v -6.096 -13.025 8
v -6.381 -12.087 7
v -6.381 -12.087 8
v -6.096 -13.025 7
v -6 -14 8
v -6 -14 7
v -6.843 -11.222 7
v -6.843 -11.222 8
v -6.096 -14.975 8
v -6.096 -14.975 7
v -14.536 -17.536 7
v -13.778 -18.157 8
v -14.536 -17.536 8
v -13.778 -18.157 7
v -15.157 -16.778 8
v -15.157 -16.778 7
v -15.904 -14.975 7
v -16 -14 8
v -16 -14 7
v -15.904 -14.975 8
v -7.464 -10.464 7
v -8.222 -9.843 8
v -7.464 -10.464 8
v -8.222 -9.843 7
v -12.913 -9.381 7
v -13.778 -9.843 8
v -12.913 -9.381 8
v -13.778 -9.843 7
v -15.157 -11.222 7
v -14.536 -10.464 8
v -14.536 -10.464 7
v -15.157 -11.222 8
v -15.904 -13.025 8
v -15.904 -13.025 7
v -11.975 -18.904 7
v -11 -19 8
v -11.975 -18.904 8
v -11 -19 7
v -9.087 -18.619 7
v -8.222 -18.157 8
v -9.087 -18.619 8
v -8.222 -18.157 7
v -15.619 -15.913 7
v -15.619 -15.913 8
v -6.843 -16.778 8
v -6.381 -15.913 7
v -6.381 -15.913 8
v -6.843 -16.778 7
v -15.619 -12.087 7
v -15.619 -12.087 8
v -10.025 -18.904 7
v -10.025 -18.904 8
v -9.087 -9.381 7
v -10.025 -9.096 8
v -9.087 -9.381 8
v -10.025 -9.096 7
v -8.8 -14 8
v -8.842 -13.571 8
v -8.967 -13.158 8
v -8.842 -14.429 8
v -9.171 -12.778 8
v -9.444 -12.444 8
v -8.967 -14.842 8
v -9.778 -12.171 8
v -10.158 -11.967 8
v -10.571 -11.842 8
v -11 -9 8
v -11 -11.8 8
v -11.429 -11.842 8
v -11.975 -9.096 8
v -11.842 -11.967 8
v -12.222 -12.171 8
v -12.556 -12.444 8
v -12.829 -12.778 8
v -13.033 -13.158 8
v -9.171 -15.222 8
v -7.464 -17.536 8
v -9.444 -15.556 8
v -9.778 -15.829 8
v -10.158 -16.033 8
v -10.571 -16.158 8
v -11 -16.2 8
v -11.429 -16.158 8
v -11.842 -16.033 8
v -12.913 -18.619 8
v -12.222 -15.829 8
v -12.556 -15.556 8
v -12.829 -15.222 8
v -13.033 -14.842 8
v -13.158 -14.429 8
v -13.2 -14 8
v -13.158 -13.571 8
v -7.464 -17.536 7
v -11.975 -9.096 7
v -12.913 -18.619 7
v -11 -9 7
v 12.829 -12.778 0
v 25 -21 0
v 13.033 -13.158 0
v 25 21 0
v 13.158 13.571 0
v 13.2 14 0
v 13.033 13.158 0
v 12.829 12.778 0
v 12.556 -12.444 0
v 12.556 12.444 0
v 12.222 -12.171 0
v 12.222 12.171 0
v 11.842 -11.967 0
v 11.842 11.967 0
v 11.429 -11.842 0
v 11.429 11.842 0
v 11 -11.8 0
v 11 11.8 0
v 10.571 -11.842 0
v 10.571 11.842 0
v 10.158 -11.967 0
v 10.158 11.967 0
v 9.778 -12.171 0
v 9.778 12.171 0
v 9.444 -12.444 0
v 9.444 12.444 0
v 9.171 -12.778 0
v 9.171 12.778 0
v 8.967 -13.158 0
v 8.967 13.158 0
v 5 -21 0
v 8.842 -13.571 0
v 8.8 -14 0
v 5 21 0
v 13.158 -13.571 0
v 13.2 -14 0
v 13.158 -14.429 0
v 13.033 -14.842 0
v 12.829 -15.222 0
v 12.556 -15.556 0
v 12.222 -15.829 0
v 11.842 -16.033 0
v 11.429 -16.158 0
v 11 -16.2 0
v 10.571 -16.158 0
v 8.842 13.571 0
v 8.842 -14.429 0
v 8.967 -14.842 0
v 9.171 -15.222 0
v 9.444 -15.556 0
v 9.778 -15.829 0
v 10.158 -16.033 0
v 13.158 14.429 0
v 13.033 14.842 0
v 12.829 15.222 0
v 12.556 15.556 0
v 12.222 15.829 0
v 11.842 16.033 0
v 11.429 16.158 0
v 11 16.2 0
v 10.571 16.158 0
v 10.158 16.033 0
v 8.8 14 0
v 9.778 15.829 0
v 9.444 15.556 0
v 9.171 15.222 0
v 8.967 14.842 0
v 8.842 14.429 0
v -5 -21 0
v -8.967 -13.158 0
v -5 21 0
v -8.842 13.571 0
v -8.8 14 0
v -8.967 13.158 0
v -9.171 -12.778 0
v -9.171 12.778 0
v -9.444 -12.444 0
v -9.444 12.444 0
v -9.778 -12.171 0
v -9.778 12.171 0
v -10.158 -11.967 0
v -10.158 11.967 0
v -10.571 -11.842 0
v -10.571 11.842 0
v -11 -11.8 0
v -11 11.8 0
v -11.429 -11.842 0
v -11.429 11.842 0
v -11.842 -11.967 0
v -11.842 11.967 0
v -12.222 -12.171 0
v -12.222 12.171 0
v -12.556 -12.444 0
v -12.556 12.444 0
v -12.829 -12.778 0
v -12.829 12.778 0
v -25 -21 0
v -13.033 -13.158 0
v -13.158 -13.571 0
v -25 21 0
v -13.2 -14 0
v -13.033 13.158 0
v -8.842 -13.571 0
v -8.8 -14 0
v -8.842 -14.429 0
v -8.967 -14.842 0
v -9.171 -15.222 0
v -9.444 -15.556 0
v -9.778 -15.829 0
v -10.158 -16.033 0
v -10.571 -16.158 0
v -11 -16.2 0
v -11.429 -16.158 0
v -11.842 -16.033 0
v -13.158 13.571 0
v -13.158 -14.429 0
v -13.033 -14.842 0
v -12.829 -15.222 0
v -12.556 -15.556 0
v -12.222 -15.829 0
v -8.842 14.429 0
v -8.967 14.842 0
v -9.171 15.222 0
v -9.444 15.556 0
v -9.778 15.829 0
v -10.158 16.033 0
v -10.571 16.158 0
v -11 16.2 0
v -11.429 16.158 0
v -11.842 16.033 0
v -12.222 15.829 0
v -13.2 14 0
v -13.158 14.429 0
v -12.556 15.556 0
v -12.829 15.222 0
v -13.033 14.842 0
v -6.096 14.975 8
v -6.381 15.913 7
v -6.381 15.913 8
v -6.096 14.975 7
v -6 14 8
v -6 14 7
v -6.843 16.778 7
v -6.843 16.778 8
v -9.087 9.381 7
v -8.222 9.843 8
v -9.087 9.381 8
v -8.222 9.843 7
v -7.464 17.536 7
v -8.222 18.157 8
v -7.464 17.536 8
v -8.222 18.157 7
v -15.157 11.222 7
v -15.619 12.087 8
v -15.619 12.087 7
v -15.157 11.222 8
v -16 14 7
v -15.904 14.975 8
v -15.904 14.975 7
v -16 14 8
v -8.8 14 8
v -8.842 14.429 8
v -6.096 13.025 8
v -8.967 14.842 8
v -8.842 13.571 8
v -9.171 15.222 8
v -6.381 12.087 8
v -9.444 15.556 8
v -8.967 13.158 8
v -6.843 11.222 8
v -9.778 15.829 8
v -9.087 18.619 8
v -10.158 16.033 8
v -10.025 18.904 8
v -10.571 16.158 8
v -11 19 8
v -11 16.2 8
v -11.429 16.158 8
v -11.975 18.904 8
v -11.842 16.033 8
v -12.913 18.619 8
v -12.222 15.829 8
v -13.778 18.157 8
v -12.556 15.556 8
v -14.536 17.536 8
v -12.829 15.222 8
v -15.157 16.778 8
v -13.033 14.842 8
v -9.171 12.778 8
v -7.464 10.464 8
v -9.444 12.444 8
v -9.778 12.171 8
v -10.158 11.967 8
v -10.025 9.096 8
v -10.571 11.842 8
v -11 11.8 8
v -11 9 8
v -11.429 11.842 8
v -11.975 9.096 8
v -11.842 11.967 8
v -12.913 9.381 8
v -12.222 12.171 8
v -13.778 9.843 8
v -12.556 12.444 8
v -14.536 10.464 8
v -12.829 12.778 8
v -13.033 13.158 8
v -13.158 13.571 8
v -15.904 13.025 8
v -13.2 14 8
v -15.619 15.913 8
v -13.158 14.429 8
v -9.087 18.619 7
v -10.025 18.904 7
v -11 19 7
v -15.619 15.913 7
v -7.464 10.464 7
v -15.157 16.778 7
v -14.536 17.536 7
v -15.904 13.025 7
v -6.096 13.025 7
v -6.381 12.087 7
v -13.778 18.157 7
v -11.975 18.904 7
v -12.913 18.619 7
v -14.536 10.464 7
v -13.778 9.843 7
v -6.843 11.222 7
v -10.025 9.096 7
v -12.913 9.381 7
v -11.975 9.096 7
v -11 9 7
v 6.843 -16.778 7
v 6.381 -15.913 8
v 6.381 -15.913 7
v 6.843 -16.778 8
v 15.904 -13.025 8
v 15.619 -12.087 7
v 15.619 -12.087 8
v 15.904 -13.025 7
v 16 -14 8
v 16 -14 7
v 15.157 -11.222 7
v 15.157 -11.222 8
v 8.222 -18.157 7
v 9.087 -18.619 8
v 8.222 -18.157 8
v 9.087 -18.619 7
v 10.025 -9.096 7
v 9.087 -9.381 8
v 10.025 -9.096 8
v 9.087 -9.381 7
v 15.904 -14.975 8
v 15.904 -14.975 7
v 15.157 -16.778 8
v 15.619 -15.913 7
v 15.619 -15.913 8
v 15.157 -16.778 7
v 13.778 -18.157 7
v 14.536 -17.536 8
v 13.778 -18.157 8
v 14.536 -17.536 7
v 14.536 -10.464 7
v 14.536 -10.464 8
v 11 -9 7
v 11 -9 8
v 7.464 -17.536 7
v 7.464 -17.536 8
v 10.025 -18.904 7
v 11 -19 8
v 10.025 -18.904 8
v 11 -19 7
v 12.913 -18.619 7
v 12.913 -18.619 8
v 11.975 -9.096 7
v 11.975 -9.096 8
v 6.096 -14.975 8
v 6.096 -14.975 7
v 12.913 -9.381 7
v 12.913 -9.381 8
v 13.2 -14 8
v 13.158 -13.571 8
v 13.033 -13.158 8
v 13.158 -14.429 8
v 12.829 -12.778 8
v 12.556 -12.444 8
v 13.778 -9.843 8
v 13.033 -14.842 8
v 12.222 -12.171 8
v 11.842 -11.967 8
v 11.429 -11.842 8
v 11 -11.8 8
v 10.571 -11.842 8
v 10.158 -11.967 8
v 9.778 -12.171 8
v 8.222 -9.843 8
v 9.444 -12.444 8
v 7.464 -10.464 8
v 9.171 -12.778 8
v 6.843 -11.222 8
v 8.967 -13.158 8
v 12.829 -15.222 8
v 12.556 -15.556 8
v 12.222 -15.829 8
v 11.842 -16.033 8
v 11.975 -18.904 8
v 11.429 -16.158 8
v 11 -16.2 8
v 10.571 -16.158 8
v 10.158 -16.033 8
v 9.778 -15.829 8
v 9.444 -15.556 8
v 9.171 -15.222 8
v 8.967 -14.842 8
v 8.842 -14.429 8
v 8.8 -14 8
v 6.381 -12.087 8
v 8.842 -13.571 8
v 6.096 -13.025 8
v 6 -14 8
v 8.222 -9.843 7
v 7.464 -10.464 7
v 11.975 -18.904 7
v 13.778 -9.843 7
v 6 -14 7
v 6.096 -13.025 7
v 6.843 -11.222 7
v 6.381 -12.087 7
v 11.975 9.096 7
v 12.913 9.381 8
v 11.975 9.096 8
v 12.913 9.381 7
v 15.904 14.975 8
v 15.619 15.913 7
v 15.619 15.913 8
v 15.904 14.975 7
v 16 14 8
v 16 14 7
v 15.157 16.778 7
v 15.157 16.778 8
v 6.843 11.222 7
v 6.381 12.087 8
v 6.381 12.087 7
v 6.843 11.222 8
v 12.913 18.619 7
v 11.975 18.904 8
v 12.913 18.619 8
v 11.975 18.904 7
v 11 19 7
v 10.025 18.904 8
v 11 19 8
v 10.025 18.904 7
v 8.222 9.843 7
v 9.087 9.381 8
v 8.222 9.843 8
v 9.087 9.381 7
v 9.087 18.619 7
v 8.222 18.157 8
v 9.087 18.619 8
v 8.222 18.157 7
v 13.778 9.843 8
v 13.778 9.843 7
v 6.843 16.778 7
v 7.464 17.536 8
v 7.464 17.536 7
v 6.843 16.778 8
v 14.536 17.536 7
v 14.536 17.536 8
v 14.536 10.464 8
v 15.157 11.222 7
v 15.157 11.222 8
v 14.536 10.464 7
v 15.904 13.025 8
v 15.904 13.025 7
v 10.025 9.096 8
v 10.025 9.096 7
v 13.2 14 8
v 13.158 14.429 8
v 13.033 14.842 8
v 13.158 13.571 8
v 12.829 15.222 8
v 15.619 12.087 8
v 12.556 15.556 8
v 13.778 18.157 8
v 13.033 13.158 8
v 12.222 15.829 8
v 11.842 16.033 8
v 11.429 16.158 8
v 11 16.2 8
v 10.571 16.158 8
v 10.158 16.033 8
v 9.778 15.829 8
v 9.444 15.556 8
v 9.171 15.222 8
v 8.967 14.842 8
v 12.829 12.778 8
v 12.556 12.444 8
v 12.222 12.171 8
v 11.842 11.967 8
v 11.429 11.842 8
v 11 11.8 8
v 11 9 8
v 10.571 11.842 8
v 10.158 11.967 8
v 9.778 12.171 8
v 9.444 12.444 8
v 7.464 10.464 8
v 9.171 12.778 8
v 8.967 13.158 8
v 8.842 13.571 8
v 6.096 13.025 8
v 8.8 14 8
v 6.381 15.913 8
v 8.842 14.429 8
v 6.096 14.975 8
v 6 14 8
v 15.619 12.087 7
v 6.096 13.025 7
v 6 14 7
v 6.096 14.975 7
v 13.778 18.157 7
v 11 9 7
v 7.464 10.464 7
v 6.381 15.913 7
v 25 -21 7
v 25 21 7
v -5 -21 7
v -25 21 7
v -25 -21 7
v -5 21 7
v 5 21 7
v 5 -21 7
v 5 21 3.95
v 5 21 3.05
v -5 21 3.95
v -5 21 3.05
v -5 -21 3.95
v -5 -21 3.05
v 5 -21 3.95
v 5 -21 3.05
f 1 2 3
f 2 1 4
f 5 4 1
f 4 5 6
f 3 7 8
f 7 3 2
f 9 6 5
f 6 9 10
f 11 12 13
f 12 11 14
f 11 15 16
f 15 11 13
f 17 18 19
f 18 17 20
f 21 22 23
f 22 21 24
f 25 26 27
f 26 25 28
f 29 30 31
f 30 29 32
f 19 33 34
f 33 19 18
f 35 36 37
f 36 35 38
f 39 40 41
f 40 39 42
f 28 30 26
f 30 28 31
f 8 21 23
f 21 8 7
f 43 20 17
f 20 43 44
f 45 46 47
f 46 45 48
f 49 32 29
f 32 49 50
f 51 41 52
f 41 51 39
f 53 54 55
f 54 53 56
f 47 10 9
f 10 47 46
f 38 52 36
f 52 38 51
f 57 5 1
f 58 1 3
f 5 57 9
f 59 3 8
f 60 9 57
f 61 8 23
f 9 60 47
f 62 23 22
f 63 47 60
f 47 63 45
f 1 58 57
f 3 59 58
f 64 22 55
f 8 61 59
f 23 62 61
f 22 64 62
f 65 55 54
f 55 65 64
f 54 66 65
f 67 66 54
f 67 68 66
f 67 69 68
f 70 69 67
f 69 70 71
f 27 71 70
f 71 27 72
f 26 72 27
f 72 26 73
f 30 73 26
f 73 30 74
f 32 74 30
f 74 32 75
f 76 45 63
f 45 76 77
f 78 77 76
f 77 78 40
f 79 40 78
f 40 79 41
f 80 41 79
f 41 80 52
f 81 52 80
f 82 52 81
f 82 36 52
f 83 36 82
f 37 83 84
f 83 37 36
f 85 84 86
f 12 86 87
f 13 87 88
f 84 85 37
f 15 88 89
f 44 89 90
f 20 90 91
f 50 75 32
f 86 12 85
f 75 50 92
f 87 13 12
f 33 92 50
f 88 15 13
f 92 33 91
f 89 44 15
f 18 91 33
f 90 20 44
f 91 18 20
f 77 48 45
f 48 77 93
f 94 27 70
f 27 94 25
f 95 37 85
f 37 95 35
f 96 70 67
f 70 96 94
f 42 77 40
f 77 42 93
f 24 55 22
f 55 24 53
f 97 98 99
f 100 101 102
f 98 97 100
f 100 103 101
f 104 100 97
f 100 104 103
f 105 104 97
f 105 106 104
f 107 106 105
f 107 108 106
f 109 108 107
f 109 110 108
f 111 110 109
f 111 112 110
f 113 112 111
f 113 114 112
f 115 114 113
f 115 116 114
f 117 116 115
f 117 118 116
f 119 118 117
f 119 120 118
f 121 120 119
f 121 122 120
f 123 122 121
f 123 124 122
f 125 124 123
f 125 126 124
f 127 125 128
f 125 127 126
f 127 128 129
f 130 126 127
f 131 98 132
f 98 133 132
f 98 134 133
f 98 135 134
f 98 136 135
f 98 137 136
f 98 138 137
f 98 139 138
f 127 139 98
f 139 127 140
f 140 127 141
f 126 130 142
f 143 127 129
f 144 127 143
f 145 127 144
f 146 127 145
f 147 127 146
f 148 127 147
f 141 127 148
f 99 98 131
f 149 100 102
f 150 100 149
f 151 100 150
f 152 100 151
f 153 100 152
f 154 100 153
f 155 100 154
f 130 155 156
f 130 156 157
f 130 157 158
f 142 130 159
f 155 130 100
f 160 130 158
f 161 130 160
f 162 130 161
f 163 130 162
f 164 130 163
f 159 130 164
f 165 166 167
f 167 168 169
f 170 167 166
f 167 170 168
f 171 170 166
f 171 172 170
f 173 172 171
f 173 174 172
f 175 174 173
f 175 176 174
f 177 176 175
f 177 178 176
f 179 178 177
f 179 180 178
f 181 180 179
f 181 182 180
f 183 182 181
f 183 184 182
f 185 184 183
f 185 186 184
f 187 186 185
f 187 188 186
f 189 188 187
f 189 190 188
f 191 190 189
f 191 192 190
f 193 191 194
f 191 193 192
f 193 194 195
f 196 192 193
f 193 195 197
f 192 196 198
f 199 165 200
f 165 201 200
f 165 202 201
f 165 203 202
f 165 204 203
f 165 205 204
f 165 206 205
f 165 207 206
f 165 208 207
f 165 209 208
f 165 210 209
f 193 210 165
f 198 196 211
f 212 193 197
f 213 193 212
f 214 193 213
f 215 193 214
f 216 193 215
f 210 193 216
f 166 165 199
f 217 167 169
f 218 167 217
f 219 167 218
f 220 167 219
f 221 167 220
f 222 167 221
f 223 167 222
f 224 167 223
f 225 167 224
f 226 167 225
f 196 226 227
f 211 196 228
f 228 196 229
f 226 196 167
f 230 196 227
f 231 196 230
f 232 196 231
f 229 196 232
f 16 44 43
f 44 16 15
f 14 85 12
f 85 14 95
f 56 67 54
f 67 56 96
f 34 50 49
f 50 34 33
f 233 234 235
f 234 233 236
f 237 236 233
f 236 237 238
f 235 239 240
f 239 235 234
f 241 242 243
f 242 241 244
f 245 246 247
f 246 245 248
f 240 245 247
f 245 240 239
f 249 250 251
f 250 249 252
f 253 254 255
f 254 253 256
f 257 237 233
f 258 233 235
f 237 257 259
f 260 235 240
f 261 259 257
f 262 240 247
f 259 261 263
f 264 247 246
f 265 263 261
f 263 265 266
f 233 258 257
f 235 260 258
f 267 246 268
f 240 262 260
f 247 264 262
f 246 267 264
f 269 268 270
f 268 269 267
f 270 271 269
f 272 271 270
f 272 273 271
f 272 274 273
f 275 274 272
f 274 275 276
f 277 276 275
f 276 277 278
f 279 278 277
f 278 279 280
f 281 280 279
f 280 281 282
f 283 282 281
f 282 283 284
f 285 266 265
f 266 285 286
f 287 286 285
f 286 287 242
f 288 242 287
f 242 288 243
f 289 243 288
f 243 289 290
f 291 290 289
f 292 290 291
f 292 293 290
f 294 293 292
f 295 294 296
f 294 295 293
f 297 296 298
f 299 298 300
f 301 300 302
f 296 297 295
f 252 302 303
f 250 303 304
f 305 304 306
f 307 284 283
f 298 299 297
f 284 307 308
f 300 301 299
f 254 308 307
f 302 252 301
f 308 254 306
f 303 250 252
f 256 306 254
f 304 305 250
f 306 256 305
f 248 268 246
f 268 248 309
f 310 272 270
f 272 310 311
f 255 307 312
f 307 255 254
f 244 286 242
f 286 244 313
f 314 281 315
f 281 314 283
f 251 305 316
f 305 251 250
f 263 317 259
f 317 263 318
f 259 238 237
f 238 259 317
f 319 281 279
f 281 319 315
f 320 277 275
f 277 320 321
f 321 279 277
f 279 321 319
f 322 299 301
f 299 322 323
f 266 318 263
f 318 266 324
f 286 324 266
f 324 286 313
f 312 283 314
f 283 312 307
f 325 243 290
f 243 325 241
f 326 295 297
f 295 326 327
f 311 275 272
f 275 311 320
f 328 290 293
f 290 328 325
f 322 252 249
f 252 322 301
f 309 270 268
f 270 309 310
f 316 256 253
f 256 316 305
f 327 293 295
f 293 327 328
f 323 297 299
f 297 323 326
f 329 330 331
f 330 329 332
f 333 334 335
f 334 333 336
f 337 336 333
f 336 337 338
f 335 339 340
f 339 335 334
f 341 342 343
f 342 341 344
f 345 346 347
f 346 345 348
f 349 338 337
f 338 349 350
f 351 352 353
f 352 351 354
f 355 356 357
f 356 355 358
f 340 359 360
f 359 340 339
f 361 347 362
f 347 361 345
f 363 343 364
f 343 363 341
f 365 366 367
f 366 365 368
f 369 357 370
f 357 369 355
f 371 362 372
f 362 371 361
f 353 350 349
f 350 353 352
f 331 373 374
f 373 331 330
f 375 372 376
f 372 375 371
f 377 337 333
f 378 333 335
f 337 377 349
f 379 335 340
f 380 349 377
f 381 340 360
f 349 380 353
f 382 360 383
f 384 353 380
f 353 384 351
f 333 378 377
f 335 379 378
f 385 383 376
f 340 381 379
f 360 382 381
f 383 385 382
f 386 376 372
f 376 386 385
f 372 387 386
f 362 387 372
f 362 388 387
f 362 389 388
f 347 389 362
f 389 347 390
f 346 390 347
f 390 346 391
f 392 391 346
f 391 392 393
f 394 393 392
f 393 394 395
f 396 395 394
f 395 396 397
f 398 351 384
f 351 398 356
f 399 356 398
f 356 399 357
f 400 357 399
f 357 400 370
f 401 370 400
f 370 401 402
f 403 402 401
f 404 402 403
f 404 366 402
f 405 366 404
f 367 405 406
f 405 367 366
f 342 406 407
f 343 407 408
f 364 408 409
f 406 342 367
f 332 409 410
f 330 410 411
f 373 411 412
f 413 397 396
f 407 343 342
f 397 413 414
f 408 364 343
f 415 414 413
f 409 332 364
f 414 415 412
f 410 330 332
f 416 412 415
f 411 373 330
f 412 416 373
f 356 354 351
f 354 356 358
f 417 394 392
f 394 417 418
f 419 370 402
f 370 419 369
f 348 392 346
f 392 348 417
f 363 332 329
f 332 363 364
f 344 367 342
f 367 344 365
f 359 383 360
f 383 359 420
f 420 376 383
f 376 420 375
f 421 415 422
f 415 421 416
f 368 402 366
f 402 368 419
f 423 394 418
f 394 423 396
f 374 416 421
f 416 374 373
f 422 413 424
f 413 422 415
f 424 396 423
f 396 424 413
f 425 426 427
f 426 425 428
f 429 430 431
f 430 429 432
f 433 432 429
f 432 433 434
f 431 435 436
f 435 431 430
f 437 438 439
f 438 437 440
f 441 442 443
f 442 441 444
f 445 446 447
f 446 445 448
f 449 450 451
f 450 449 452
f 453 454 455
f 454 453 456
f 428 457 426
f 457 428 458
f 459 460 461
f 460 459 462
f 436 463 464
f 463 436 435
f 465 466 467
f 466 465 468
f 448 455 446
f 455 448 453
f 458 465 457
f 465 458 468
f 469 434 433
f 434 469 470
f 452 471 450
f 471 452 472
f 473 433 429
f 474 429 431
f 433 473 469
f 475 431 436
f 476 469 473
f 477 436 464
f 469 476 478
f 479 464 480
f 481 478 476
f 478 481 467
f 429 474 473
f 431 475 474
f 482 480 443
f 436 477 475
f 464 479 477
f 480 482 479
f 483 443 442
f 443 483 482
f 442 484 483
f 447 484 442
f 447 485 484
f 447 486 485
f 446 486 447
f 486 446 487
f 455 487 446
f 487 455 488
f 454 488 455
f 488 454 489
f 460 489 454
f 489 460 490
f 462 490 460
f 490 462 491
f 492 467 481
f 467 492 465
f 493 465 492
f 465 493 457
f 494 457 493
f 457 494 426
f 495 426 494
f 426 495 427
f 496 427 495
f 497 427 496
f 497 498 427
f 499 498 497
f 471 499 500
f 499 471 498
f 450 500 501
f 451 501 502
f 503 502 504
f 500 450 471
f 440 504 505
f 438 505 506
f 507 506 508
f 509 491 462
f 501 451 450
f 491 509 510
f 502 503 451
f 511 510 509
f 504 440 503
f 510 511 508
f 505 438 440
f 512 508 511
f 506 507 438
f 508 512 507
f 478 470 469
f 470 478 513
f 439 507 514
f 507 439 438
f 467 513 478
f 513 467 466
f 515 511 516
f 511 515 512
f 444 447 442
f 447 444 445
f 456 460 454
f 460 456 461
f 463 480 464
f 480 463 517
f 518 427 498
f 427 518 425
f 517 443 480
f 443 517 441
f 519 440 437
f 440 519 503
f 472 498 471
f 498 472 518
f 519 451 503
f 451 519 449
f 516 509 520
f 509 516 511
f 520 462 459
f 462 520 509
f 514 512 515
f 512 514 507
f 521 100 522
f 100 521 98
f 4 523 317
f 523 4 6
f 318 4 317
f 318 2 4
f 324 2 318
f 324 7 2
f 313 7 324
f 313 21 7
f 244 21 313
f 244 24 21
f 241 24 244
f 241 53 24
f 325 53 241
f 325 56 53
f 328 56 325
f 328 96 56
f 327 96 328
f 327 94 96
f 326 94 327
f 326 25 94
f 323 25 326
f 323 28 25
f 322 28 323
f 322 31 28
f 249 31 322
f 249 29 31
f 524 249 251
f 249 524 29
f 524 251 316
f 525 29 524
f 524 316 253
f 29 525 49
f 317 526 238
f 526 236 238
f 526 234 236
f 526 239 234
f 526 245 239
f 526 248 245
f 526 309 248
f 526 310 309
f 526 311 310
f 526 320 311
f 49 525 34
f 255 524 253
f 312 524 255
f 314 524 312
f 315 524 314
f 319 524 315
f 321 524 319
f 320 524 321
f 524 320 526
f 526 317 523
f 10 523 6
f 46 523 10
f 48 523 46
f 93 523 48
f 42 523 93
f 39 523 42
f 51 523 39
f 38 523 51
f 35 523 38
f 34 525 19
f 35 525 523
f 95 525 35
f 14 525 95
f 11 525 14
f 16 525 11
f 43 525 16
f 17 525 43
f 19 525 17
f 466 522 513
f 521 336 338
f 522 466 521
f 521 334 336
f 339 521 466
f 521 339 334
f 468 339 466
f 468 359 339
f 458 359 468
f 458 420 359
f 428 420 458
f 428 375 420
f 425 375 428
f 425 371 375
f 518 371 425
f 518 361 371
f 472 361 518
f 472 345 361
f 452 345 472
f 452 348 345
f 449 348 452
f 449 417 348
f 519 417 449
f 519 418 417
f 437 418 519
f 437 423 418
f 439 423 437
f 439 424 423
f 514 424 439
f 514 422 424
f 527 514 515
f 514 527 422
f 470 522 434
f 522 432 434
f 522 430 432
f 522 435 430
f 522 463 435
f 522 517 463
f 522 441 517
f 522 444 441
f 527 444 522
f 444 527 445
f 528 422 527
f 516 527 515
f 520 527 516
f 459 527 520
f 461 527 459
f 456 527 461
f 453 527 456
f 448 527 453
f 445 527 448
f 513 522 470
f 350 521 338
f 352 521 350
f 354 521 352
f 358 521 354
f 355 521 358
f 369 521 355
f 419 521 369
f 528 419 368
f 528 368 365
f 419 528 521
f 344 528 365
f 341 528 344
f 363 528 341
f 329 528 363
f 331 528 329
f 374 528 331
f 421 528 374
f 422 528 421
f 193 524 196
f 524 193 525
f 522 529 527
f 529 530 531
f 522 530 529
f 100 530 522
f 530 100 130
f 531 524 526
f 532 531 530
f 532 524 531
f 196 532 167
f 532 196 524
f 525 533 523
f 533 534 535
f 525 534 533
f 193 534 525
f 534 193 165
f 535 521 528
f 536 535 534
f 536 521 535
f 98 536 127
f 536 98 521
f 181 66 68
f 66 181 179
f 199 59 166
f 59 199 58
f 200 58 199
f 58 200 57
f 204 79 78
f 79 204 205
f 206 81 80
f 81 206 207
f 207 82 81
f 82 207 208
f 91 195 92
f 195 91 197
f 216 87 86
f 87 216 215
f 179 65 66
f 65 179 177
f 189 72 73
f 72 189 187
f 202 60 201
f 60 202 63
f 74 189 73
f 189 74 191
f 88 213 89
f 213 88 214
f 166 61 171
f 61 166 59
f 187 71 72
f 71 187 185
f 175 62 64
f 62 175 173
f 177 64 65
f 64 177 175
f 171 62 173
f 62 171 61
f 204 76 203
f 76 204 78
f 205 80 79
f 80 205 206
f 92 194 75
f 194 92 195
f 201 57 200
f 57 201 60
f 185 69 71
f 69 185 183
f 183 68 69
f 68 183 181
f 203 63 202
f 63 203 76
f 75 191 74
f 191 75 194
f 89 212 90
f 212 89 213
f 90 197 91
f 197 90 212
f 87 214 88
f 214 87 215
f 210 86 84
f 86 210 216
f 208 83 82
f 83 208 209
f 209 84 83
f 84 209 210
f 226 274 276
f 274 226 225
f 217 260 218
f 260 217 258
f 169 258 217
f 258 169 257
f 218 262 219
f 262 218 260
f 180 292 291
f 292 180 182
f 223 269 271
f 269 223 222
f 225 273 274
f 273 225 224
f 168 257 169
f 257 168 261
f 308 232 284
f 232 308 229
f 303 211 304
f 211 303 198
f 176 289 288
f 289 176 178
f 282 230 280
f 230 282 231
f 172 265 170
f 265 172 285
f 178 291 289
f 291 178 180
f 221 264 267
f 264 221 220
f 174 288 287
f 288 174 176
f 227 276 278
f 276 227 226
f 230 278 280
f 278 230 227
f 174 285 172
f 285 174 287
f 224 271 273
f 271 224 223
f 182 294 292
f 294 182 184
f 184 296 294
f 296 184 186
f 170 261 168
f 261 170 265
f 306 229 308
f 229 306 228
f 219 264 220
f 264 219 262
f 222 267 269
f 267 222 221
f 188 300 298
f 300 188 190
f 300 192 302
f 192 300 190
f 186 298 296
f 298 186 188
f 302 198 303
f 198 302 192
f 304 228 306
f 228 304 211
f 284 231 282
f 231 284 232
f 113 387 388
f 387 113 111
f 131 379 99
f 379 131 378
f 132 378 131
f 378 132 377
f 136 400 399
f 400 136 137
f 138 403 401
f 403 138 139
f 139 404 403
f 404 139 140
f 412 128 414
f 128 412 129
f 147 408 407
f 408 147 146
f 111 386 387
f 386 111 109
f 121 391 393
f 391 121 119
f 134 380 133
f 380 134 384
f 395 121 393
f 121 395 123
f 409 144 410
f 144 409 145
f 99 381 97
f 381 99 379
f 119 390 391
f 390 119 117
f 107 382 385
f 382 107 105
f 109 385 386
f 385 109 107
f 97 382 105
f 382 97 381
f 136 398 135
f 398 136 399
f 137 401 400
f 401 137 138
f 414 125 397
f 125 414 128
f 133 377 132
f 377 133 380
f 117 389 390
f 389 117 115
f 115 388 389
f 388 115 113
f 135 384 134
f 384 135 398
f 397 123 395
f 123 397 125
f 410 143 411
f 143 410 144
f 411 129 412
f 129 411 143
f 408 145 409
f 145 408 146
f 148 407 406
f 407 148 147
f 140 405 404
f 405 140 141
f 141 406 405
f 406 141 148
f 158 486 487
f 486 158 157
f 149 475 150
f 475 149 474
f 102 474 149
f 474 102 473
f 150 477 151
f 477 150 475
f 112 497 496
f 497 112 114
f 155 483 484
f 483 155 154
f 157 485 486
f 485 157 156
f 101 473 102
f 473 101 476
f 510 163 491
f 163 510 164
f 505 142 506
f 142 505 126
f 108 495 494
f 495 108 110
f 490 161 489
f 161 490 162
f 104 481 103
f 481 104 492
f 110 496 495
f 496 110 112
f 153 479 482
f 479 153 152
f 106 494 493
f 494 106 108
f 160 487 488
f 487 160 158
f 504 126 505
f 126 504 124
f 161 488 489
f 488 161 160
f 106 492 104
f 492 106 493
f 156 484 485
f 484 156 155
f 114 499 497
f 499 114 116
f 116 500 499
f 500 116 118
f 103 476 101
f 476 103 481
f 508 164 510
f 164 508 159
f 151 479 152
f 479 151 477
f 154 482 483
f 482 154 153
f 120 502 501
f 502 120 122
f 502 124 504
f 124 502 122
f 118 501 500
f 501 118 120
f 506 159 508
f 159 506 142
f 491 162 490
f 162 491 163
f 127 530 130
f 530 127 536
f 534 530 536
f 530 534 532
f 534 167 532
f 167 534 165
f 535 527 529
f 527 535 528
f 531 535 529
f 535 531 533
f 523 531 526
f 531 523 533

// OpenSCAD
$fn = 32;
// ----------------------------------------------------------------------
// Living hinge: 50 x 42 mm plates, 0.9 mm flexible web
// ----------------------------------------------------------------------

// --- parameters (mm) ---
plate_len = 20;           // plate length outside the web
plate_w = 42;             // plate width
thick = 7;                // plate thickness
web_half = 5;             // half width of the flex band
web_t = 0.9;              // flexible web thickness
web_z = 3.05;             // web position inside the thickness
boss_d = 10;              // screw boss diameter
boss_h = 8;               // screw boss height
boss_x = 11;              // screw boss distance from the web
screw_d = 4.4;            // screw hole

difference() {
  union() {
    /* one flat strip, later thinned at the middle */
    translate([-25, -21, 0]) cube([50, 42, 7]);
    /* screw bosses, sunk 0.5 mm into the plates */
    for (sx = [-11, 11]) {
      for (sy = [-14, 14]) {
        translate([sx, sy, 0]) cylinder(h = boss_h, d = boss_d);
      }
    }
  }
  /* channel from below: leaves the web on top of it */
  translate([-5, -23.5, -2.5]) cube([10, 47, 5.55]);
  /* channel from above: thins the web down to web_t */
  translate([-5, -23.5, 3.95]) cube([10, 47, 5.55]);
  /* screw holes through the bosses */
  for (sx = [-11, 11]) {
    for (sy = [-14, 14]) {
      translate([sx, sy, -2.5]) cylinder(h = boss_h + 5, d = screw_d);
    }
  }
}
